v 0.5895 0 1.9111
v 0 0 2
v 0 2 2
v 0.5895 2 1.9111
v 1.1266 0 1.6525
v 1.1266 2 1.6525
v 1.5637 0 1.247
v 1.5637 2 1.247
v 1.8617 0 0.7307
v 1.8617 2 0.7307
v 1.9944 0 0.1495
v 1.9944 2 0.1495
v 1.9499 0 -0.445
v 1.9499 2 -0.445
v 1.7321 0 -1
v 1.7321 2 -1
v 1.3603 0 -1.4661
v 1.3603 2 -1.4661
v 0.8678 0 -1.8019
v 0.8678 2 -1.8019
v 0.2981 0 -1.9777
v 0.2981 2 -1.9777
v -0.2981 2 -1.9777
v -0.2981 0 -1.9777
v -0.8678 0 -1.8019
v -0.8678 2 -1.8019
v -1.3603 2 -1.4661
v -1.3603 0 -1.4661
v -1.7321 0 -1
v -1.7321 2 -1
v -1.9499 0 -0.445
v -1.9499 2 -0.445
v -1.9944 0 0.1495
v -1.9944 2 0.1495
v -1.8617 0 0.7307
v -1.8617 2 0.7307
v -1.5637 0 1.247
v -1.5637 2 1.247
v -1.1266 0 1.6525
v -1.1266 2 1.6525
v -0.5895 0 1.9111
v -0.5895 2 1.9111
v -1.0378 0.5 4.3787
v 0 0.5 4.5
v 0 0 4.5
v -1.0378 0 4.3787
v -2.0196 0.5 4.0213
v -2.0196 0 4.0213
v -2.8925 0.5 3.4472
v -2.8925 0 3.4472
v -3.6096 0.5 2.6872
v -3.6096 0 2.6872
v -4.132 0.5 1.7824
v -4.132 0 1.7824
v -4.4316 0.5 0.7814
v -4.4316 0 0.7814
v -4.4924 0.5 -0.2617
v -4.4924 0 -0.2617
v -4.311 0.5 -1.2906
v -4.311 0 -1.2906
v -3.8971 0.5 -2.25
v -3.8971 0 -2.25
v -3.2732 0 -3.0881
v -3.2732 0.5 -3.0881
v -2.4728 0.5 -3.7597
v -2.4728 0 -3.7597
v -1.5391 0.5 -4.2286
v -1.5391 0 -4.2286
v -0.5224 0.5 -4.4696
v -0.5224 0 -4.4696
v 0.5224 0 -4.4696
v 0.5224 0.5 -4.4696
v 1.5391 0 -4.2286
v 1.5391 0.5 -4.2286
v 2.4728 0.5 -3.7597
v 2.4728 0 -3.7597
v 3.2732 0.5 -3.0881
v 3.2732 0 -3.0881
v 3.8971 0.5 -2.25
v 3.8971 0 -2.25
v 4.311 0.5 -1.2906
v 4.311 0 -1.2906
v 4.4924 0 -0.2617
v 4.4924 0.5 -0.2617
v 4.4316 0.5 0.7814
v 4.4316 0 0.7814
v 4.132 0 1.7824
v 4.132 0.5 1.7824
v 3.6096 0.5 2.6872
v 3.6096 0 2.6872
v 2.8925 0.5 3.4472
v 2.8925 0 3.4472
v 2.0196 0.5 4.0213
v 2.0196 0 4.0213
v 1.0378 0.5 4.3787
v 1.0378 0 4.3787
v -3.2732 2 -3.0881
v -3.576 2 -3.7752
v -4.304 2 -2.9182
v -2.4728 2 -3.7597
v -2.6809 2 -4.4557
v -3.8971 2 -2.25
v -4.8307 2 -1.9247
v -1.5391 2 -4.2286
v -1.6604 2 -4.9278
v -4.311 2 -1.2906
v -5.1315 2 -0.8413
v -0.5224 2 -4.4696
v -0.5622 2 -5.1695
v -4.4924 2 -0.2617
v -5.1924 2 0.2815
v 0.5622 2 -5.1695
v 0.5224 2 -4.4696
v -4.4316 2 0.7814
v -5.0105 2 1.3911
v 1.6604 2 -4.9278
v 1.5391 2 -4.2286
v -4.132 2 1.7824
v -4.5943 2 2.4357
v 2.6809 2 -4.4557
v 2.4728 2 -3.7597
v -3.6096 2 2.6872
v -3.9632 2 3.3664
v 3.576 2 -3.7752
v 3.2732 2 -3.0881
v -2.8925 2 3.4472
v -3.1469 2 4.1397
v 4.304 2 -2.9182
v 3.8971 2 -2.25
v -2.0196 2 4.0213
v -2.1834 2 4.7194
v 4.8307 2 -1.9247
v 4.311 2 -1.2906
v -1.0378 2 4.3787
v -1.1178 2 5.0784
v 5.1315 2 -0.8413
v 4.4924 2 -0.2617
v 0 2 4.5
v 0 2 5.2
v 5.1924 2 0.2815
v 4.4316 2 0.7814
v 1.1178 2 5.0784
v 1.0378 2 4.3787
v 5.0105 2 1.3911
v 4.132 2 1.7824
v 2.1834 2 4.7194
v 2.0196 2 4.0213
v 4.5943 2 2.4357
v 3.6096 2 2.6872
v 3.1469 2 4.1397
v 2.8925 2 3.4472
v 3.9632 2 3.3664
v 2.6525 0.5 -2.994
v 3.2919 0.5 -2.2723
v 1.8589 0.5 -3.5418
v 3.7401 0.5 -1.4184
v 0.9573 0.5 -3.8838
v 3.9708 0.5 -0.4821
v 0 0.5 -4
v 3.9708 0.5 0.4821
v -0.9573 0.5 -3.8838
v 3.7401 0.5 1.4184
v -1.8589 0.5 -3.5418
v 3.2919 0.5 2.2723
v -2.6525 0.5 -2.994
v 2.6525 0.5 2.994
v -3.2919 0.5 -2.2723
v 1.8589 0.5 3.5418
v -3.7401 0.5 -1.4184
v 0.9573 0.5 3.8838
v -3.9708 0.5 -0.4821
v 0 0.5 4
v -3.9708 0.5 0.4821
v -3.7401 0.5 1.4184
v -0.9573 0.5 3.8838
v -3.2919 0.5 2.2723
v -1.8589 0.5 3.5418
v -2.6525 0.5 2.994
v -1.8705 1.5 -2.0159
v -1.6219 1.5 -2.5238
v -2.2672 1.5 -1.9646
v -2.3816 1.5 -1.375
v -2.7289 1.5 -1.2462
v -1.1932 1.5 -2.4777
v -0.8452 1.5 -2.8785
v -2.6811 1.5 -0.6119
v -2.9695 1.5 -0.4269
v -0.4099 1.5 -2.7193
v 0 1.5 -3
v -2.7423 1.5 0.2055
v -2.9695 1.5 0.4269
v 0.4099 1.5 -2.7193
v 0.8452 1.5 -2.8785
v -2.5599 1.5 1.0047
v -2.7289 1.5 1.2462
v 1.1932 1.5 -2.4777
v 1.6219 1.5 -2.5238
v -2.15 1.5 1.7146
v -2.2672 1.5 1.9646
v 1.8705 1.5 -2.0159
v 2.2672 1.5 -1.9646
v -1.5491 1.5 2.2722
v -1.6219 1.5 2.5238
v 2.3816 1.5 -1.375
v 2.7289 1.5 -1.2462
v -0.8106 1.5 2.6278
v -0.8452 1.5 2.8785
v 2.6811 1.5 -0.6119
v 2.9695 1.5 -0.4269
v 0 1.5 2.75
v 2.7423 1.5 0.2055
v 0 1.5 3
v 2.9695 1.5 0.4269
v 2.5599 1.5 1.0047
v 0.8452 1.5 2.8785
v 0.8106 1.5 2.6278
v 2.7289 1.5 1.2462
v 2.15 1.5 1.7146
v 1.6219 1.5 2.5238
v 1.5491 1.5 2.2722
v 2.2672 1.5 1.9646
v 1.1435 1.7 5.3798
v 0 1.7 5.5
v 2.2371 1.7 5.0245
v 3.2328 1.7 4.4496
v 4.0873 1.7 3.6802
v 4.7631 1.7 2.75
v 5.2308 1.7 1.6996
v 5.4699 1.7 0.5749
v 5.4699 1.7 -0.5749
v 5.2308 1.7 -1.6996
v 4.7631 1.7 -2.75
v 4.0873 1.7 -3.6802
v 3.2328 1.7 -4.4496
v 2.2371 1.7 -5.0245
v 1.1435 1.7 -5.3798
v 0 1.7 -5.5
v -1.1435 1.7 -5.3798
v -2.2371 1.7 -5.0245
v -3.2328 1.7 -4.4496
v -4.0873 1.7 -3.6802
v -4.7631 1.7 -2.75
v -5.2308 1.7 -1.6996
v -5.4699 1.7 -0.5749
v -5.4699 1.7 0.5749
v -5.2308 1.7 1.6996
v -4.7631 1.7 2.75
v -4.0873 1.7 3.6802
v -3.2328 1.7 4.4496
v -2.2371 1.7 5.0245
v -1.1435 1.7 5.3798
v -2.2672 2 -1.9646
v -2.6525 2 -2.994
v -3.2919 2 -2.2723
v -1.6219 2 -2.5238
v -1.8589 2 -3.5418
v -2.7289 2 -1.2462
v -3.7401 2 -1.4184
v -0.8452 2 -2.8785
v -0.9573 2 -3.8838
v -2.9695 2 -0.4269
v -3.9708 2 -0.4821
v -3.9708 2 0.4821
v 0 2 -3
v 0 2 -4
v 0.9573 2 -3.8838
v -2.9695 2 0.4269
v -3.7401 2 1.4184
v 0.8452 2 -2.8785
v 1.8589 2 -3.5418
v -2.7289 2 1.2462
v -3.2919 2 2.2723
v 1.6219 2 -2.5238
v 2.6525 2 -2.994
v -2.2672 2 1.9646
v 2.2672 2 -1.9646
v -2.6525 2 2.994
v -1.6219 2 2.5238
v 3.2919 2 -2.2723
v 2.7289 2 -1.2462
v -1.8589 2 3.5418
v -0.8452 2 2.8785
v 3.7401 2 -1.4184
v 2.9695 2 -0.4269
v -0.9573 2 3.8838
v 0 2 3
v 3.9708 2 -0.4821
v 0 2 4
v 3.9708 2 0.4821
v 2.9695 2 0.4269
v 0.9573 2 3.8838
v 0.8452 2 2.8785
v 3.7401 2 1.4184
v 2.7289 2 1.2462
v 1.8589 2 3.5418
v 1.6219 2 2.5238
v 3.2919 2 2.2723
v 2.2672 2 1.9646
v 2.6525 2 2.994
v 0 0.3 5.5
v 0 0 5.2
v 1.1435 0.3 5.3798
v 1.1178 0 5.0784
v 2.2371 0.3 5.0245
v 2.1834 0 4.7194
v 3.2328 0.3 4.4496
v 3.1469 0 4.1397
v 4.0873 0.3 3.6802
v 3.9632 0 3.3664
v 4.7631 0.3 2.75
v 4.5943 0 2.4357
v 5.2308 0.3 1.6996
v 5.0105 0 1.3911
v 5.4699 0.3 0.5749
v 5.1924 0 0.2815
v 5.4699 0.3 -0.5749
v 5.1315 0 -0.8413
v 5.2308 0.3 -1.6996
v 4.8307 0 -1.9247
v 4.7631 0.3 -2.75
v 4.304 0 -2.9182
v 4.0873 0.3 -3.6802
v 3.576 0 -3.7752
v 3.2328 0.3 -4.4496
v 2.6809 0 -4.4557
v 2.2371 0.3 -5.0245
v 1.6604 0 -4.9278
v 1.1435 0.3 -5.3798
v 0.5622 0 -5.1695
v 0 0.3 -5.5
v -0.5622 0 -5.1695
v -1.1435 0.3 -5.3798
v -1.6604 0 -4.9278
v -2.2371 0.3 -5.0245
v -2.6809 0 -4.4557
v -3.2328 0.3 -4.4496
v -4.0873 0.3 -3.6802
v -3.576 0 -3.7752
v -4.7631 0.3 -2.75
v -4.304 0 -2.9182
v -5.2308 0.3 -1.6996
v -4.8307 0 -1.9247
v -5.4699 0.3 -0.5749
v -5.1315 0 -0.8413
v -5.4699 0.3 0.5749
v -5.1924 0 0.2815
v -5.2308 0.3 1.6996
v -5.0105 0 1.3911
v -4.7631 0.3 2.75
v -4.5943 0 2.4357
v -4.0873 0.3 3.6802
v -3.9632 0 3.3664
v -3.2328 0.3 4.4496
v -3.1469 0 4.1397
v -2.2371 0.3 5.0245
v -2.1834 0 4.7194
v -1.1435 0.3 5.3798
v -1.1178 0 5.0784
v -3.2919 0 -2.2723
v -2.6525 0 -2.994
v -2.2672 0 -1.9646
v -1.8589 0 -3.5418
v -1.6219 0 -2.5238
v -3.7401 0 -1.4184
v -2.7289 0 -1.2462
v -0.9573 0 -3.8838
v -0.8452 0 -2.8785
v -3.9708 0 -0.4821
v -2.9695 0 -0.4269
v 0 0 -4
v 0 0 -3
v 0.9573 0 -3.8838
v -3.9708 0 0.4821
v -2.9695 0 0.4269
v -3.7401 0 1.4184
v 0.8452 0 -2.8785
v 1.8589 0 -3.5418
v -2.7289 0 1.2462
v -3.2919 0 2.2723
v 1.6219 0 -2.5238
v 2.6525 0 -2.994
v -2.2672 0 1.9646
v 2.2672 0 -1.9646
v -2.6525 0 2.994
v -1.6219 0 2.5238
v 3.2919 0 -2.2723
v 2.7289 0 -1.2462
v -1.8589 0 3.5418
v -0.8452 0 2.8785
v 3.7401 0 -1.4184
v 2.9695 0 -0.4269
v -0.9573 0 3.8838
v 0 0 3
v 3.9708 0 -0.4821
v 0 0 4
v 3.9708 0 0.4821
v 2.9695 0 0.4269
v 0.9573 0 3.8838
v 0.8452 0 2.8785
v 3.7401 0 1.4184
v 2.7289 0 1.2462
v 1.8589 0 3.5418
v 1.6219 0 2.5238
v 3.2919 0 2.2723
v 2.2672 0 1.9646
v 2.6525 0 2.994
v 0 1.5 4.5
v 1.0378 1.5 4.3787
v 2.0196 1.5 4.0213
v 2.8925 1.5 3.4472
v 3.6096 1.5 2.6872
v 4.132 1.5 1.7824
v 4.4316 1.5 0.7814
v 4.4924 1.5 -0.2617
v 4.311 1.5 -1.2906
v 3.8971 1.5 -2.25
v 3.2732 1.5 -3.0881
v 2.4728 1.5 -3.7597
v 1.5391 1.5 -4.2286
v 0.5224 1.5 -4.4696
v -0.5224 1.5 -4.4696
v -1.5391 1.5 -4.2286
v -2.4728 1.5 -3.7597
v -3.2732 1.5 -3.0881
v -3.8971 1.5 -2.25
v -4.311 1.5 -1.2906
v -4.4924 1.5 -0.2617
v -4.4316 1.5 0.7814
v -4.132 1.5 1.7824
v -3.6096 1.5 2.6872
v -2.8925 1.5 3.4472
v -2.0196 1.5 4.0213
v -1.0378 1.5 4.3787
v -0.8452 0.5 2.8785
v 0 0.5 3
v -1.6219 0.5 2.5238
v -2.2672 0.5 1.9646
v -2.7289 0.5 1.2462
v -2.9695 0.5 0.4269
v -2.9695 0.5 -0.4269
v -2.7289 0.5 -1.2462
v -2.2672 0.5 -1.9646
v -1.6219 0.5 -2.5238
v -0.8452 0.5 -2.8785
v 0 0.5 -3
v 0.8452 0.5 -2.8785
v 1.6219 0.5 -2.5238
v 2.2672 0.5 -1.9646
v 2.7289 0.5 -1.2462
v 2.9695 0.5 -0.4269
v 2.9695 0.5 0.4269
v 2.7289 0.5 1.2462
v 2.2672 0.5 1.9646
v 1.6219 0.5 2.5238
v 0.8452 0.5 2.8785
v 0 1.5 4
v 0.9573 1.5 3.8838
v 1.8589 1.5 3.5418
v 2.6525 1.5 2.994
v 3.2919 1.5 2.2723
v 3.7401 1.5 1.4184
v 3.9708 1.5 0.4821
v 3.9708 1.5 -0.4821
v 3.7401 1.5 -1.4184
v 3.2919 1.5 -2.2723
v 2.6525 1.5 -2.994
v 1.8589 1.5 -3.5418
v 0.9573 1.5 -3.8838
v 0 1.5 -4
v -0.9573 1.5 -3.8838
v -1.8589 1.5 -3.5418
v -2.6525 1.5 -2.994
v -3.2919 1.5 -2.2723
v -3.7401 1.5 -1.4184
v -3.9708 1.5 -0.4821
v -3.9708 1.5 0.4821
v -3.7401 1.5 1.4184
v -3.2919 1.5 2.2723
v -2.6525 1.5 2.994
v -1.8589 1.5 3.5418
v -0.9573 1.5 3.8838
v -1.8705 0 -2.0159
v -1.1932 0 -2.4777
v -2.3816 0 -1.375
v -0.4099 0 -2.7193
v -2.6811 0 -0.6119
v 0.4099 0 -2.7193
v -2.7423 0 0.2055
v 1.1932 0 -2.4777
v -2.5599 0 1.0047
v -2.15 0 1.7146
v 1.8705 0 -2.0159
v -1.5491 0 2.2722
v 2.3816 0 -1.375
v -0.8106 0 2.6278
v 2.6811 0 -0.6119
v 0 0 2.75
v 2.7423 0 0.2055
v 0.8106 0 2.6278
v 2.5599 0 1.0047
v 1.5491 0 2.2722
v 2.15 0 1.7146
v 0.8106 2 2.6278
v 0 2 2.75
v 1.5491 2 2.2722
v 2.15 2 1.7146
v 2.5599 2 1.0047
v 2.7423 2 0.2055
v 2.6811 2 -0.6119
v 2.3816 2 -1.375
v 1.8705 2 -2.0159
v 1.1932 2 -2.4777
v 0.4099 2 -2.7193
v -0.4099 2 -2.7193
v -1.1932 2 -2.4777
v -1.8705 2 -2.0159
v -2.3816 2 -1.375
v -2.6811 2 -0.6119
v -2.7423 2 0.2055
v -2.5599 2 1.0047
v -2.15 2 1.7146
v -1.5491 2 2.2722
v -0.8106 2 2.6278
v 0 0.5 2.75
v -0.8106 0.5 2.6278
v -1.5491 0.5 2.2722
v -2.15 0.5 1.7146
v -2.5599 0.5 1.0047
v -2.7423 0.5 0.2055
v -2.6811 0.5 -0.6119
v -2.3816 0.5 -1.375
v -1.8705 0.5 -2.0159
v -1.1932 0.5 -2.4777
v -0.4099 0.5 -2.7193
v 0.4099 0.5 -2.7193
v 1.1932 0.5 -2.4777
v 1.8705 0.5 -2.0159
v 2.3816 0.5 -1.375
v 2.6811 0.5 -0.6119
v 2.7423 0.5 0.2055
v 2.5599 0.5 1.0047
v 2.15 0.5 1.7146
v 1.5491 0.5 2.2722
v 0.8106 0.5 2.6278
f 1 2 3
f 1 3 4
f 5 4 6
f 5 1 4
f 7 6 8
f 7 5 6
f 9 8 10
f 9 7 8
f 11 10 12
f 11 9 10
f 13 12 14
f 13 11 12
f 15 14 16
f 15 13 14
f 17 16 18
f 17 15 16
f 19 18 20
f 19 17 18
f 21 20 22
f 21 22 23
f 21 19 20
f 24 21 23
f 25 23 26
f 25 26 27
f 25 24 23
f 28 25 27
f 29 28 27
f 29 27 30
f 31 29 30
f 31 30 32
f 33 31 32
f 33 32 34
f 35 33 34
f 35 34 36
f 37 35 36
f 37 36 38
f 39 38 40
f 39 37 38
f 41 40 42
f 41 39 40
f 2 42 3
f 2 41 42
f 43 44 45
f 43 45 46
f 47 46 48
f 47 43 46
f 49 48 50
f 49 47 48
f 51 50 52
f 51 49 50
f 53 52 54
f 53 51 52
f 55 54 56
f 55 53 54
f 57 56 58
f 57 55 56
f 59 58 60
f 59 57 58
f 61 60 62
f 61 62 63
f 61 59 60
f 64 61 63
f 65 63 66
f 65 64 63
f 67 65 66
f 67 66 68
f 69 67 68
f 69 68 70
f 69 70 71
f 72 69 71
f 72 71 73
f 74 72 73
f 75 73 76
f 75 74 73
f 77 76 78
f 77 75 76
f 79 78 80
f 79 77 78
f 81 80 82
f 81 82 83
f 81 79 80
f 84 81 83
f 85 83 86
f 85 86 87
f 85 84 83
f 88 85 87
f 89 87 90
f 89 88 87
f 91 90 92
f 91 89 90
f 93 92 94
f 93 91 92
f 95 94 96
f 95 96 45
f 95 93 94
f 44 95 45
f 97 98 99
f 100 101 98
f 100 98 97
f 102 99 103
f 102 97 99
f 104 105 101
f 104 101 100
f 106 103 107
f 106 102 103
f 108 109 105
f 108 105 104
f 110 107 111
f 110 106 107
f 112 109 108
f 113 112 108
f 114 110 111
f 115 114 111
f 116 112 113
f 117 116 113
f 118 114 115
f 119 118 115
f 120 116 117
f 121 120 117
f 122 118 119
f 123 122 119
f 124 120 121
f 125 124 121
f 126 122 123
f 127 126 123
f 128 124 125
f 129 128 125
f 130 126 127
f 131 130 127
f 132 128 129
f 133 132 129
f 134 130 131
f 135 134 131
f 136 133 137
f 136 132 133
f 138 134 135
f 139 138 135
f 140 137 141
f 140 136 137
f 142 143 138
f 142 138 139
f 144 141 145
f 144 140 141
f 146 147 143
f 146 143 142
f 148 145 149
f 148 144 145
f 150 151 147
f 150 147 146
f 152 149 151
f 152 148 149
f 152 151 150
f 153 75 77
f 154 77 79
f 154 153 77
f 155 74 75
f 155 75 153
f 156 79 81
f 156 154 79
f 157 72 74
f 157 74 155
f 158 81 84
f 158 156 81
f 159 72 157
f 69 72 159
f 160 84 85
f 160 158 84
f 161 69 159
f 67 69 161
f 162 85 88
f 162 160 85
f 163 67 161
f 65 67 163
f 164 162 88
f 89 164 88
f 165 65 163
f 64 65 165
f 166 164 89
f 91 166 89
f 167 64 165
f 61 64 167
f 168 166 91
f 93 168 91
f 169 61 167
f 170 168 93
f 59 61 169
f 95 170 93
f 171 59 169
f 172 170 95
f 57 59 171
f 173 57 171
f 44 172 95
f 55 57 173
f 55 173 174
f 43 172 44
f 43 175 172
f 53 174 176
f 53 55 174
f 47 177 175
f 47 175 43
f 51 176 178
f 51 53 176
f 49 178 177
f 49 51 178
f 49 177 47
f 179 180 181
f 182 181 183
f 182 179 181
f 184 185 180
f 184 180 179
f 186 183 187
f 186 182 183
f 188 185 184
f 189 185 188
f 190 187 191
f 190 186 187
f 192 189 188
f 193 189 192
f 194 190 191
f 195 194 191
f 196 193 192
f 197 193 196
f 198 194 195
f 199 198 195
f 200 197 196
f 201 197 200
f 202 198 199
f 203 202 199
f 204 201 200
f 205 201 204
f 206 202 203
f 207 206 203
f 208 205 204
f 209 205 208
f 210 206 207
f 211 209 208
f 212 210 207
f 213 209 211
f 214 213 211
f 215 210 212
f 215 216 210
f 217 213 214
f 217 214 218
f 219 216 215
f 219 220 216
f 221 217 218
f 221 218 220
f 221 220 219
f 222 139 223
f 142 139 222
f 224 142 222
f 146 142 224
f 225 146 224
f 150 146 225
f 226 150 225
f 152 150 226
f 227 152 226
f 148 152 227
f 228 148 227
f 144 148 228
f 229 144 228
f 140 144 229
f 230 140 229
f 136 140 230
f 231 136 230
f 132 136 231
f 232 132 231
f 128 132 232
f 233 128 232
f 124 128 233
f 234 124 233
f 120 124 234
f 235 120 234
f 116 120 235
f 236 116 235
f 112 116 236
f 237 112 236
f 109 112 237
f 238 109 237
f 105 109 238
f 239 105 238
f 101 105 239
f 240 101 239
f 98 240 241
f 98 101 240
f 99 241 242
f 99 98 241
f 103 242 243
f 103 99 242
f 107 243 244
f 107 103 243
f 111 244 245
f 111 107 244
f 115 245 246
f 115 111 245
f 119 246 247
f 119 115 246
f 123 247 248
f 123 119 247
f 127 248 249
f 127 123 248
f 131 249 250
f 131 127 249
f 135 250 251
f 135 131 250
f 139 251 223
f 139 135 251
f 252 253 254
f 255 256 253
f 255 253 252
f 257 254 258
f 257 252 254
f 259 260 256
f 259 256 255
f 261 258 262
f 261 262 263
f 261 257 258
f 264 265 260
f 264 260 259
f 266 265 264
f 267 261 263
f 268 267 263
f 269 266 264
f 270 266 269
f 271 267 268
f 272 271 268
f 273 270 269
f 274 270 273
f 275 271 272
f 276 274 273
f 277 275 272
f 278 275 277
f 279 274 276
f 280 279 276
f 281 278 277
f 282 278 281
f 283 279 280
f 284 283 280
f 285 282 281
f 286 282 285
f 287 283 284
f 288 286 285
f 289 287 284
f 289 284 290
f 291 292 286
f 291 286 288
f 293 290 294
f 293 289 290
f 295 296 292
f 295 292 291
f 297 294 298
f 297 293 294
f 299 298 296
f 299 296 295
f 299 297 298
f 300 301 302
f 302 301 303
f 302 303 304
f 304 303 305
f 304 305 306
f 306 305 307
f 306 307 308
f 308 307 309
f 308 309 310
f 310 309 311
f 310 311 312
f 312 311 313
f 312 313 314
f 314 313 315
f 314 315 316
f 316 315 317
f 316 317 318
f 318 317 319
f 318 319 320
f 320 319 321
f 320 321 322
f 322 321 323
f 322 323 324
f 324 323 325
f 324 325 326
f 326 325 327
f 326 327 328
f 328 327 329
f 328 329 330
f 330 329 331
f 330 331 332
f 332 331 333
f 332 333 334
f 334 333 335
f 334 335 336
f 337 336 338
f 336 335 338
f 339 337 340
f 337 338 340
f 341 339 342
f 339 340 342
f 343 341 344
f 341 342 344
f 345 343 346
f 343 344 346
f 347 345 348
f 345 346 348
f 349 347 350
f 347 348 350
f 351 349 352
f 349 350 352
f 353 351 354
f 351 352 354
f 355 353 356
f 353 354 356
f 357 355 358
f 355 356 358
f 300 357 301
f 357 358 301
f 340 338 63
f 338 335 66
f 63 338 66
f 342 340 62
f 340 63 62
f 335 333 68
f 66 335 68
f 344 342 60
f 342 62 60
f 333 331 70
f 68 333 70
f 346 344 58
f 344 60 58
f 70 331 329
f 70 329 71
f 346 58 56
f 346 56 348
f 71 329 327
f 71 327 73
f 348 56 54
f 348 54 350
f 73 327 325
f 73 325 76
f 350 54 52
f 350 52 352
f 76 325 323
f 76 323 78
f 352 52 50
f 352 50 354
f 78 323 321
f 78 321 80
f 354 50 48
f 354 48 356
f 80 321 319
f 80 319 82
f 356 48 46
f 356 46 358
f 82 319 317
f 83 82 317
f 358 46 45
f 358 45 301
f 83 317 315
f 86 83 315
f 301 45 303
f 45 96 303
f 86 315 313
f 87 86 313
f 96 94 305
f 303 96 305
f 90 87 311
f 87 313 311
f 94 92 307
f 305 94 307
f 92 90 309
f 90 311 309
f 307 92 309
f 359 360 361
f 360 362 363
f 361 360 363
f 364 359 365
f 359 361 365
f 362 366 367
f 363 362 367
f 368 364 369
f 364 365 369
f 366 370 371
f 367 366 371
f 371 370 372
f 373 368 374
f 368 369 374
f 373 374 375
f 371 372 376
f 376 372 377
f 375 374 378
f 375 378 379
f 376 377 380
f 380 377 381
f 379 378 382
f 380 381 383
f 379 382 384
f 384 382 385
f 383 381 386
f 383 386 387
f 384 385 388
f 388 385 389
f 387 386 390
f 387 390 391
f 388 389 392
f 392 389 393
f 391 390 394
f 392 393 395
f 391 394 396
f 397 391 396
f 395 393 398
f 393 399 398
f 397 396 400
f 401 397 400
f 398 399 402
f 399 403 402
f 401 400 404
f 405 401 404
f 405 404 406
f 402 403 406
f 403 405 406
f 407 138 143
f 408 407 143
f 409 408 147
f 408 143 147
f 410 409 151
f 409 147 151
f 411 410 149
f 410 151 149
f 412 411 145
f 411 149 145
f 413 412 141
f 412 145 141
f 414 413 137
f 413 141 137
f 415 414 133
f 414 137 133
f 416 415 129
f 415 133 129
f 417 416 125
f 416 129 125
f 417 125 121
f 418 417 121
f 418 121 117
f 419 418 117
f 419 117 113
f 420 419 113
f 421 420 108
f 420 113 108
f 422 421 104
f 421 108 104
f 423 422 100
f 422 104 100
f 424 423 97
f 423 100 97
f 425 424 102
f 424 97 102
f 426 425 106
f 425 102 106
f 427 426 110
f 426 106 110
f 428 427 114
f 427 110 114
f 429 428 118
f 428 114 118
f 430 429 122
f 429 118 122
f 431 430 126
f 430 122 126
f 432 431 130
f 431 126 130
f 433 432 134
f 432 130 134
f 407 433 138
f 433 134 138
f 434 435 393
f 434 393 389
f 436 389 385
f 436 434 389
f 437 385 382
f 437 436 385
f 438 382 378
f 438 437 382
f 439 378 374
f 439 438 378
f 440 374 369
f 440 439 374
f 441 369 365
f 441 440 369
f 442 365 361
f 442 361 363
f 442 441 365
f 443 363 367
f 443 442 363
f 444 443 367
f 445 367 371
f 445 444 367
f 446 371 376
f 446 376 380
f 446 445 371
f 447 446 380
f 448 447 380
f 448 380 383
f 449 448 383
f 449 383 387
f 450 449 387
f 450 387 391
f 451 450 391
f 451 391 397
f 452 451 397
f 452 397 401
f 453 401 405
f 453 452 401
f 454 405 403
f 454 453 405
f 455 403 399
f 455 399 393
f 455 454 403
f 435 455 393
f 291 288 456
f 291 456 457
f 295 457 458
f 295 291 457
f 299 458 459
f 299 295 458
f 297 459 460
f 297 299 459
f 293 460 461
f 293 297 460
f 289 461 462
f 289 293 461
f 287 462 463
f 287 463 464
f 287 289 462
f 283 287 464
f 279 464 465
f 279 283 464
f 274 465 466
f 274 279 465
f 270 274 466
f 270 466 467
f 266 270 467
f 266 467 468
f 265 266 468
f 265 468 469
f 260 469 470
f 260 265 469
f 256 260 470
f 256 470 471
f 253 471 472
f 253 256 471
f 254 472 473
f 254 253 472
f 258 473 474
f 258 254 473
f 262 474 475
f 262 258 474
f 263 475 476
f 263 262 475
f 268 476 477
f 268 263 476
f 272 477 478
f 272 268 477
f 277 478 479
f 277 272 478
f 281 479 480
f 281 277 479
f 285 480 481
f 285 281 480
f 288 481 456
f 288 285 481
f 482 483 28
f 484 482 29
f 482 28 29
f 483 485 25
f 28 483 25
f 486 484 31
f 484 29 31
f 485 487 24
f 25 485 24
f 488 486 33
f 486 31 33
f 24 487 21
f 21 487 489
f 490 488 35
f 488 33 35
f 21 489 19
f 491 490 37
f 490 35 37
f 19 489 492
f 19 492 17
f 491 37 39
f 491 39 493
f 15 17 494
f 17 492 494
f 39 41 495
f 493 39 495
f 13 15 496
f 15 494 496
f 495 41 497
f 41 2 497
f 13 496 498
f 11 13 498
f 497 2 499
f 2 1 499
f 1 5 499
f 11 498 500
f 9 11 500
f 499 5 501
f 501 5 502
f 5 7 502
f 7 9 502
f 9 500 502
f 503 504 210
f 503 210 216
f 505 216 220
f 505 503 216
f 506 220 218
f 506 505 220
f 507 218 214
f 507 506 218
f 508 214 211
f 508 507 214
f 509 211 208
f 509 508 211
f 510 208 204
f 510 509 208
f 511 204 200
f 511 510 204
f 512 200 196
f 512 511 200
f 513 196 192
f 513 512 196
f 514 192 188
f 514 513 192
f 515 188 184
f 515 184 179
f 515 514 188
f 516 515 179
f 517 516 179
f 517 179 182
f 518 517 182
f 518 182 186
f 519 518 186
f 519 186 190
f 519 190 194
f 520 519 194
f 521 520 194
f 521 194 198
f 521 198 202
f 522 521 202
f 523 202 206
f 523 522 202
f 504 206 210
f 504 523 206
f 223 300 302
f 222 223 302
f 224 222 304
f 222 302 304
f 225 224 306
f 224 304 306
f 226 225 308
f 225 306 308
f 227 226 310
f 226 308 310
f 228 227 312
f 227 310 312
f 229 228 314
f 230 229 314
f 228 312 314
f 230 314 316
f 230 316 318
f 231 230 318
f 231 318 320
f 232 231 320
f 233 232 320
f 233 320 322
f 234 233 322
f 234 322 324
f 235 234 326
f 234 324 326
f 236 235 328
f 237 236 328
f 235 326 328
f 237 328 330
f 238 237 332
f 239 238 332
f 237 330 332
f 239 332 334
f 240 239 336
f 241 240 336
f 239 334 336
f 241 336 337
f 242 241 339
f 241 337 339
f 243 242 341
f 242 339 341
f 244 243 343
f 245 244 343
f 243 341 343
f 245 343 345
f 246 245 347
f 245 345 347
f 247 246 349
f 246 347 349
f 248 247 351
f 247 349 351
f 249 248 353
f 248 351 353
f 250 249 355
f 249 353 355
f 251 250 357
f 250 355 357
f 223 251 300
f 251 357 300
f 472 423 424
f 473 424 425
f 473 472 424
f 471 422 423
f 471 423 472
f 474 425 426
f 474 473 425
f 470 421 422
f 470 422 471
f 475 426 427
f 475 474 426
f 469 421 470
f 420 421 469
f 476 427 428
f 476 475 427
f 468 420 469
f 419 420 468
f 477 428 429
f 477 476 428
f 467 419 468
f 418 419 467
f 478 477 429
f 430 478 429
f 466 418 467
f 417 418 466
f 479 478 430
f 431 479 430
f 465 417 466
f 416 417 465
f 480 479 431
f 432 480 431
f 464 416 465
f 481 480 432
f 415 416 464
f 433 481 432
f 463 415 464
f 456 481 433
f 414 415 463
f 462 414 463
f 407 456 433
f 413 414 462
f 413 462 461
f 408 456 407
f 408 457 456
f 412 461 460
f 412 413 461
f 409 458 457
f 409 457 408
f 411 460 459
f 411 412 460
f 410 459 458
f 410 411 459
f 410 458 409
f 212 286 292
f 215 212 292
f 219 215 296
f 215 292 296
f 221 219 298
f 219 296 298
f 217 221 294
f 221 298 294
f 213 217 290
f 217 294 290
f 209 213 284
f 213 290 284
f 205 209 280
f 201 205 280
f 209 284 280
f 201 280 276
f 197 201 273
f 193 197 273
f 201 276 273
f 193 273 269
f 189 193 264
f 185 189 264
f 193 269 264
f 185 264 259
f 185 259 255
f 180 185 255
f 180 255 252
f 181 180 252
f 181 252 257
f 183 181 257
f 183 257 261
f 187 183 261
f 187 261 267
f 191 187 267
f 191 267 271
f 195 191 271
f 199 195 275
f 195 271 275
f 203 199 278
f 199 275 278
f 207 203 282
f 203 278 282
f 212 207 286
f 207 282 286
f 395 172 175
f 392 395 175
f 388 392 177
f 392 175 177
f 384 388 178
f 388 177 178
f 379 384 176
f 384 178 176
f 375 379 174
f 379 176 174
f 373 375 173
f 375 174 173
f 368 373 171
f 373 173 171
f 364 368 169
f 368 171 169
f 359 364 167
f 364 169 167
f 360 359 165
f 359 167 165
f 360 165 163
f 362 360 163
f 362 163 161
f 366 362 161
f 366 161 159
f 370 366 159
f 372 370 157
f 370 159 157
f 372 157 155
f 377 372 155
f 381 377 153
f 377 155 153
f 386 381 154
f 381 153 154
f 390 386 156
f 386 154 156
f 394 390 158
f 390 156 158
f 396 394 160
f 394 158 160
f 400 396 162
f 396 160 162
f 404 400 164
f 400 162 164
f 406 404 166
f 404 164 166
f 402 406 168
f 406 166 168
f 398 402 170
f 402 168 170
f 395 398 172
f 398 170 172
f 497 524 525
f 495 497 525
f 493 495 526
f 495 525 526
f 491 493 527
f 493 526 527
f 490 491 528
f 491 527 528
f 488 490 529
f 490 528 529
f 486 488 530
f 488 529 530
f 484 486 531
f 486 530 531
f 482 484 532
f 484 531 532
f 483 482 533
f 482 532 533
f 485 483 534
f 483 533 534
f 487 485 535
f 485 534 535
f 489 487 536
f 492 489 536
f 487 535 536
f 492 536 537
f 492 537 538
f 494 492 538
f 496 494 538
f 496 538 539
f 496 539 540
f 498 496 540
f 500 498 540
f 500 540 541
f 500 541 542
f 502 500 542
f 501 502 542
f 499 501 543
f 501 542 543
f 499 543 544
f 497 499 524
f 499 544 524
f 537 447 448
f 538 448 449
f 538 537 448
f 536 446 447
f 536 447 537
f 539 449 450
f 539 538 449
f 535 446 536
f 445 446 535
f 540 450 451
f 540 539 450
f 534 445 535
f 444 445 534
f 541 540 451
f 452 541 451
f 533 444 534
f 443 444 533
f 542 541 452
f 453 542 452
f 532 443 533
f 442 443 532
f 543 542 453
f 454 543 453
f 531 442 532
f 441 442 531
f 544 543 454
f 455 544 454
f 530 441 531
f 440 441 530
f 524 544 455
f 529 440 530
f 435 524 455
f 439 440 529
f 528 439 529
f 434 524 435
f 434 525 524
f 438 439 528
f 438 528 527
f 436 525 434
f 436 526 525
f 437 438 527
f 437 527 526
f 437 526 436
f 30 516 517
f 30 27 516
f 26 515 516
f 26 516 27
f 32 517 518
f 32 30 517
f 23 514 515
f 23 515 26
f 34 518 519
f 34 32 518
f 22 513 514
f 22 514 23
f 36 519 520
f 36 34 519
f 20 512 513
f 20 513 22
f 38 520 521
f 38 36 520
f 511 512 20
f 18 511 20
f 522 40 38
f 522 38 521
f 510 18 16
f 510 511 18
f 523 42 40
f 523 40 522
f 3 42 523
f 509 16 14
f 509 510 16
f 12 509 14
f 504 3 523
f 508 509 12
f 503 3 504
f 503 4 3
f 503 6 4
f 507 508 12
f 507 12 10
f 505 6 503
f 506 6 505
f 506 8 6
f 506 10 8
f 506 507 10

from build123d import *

# Parameters (mm, degrees)
SKETCH1_R           = 5.5
SKETCH1_R_2         = 2
BOSS_EXTRUDE1_DEPTH = 2
SKETCH2_R           = 4.5
SKETCH2_R_2         = 4
SKETCH2_R_3         = 3
SKETCH2_R_4         = 2.75
CUT_EXTRUDE1_DEPTH  = 0.5
CUT_EXTRUDE2_START  = -0.5
SKETCH3_R           = 4.5
SKETCH3_R_2         = 4
SKETCH3_R_3         = 3
SKETCH3_R_4         = 2.75
CUT_EXTRUDE2_DEPTH  = 0.5
CHAMFER1_SIZE       = 0.3


with BuildPart() as part:
    # Sketch1 → Boss-Extrude1 (new body)
    with BuildSketch(Plane(origin=(0, 0, 0), x_dir=(1, 0, 0), z_dir=(0, 1, 0))):
        with Locations(Location((0, 0, 0), (0, 0, 270))):
            Circle(SKETCH1_R)
        with Locations(Location((0, 0, 0), (0, 0, 270))):
            Circle(SKETCH1_R_2, mode=Mode.SUBTRACT)
    extrude(amount=BOSS_EXTRUDE1_DEPTH)

    # Sketch2 → Cut-Extrude1 (cut)
    # profile 1 of 2: a face of its own
    with BuildSketch(Plane(origin=(0, 2, 0), x_dir=(1, 0, 0), z_dir=(0, 1, 0))):
        with Locations(Location((0, 0, 0), (0, 0, 270))):
            Circle(SKETCH2_R)
        with Locations(Location((0, 0, 0), (0, 0, 270))):
            Circle(SKETCH2_R_2, mode=Mode.SUBTRACT)
    # profile 2 of 2: a face of its own
    with BuildSketch(Plane(origin=(0, 2, 0), x_dir=(1, 0, 0), z_dir=(0, 1, 0))):
        with Locations(Location((0, 0, 0), (0, 0, 270))):
            Circle(SKETCH2_R_3)
        with Locations(Location((0, 0, 0), (0, 0, 270))):
            Circle(SKETCH2_R_4, mode=Mode.SUBTRACT)
    extrude(amount=-CUT_EXTRUDE1_DEPTH, mode=Mode.SUBTRACT)

    # Sketch3 → Cut-Extrude2 (cut)
    # profile 1 of 2: a face of its own
    with BuildSketch(Plane.XZ.offset(CUT_EXTRUDE2_START)):
        with Locations(Location((0, 0, 0), (0, 0, 90))):
            Circle(SKETCH3_R)
        with Locations(Location((0, 0, 0), (0, 0, 90))):
            Circle(SKETCH3_R_2, mode=Mode.SUBTRACT)
    # profile 2 of 2: a face of its own
    with BuildSketch(Plane.XZ.offset(CUT_EXTRUDE2_START)):
        with Locations(Location((0, 0, 0), (0, 0, 90))):
            Circle(SKETCH3_R_3)
        with Locations(Location((0, 0, 0), (0, 0, 90))):
            Circle(SKETCH3_R_4, mode=Mode.SUBTRACT)
    extrude(amount=CUT_EXTRUDE2_DEPTH, mode=Mode.SUBTRACT)

    # Chamfer1
    chamfer1_edges = [part.edges().sort_by_distance(p)[0] for p in [
        (0, 0, -5.5),
        (0, 2, -5.5),
    ]]
    chamfer(chamfer1_edges, length=CHAMFER1_SIZE)


solid = part.part
